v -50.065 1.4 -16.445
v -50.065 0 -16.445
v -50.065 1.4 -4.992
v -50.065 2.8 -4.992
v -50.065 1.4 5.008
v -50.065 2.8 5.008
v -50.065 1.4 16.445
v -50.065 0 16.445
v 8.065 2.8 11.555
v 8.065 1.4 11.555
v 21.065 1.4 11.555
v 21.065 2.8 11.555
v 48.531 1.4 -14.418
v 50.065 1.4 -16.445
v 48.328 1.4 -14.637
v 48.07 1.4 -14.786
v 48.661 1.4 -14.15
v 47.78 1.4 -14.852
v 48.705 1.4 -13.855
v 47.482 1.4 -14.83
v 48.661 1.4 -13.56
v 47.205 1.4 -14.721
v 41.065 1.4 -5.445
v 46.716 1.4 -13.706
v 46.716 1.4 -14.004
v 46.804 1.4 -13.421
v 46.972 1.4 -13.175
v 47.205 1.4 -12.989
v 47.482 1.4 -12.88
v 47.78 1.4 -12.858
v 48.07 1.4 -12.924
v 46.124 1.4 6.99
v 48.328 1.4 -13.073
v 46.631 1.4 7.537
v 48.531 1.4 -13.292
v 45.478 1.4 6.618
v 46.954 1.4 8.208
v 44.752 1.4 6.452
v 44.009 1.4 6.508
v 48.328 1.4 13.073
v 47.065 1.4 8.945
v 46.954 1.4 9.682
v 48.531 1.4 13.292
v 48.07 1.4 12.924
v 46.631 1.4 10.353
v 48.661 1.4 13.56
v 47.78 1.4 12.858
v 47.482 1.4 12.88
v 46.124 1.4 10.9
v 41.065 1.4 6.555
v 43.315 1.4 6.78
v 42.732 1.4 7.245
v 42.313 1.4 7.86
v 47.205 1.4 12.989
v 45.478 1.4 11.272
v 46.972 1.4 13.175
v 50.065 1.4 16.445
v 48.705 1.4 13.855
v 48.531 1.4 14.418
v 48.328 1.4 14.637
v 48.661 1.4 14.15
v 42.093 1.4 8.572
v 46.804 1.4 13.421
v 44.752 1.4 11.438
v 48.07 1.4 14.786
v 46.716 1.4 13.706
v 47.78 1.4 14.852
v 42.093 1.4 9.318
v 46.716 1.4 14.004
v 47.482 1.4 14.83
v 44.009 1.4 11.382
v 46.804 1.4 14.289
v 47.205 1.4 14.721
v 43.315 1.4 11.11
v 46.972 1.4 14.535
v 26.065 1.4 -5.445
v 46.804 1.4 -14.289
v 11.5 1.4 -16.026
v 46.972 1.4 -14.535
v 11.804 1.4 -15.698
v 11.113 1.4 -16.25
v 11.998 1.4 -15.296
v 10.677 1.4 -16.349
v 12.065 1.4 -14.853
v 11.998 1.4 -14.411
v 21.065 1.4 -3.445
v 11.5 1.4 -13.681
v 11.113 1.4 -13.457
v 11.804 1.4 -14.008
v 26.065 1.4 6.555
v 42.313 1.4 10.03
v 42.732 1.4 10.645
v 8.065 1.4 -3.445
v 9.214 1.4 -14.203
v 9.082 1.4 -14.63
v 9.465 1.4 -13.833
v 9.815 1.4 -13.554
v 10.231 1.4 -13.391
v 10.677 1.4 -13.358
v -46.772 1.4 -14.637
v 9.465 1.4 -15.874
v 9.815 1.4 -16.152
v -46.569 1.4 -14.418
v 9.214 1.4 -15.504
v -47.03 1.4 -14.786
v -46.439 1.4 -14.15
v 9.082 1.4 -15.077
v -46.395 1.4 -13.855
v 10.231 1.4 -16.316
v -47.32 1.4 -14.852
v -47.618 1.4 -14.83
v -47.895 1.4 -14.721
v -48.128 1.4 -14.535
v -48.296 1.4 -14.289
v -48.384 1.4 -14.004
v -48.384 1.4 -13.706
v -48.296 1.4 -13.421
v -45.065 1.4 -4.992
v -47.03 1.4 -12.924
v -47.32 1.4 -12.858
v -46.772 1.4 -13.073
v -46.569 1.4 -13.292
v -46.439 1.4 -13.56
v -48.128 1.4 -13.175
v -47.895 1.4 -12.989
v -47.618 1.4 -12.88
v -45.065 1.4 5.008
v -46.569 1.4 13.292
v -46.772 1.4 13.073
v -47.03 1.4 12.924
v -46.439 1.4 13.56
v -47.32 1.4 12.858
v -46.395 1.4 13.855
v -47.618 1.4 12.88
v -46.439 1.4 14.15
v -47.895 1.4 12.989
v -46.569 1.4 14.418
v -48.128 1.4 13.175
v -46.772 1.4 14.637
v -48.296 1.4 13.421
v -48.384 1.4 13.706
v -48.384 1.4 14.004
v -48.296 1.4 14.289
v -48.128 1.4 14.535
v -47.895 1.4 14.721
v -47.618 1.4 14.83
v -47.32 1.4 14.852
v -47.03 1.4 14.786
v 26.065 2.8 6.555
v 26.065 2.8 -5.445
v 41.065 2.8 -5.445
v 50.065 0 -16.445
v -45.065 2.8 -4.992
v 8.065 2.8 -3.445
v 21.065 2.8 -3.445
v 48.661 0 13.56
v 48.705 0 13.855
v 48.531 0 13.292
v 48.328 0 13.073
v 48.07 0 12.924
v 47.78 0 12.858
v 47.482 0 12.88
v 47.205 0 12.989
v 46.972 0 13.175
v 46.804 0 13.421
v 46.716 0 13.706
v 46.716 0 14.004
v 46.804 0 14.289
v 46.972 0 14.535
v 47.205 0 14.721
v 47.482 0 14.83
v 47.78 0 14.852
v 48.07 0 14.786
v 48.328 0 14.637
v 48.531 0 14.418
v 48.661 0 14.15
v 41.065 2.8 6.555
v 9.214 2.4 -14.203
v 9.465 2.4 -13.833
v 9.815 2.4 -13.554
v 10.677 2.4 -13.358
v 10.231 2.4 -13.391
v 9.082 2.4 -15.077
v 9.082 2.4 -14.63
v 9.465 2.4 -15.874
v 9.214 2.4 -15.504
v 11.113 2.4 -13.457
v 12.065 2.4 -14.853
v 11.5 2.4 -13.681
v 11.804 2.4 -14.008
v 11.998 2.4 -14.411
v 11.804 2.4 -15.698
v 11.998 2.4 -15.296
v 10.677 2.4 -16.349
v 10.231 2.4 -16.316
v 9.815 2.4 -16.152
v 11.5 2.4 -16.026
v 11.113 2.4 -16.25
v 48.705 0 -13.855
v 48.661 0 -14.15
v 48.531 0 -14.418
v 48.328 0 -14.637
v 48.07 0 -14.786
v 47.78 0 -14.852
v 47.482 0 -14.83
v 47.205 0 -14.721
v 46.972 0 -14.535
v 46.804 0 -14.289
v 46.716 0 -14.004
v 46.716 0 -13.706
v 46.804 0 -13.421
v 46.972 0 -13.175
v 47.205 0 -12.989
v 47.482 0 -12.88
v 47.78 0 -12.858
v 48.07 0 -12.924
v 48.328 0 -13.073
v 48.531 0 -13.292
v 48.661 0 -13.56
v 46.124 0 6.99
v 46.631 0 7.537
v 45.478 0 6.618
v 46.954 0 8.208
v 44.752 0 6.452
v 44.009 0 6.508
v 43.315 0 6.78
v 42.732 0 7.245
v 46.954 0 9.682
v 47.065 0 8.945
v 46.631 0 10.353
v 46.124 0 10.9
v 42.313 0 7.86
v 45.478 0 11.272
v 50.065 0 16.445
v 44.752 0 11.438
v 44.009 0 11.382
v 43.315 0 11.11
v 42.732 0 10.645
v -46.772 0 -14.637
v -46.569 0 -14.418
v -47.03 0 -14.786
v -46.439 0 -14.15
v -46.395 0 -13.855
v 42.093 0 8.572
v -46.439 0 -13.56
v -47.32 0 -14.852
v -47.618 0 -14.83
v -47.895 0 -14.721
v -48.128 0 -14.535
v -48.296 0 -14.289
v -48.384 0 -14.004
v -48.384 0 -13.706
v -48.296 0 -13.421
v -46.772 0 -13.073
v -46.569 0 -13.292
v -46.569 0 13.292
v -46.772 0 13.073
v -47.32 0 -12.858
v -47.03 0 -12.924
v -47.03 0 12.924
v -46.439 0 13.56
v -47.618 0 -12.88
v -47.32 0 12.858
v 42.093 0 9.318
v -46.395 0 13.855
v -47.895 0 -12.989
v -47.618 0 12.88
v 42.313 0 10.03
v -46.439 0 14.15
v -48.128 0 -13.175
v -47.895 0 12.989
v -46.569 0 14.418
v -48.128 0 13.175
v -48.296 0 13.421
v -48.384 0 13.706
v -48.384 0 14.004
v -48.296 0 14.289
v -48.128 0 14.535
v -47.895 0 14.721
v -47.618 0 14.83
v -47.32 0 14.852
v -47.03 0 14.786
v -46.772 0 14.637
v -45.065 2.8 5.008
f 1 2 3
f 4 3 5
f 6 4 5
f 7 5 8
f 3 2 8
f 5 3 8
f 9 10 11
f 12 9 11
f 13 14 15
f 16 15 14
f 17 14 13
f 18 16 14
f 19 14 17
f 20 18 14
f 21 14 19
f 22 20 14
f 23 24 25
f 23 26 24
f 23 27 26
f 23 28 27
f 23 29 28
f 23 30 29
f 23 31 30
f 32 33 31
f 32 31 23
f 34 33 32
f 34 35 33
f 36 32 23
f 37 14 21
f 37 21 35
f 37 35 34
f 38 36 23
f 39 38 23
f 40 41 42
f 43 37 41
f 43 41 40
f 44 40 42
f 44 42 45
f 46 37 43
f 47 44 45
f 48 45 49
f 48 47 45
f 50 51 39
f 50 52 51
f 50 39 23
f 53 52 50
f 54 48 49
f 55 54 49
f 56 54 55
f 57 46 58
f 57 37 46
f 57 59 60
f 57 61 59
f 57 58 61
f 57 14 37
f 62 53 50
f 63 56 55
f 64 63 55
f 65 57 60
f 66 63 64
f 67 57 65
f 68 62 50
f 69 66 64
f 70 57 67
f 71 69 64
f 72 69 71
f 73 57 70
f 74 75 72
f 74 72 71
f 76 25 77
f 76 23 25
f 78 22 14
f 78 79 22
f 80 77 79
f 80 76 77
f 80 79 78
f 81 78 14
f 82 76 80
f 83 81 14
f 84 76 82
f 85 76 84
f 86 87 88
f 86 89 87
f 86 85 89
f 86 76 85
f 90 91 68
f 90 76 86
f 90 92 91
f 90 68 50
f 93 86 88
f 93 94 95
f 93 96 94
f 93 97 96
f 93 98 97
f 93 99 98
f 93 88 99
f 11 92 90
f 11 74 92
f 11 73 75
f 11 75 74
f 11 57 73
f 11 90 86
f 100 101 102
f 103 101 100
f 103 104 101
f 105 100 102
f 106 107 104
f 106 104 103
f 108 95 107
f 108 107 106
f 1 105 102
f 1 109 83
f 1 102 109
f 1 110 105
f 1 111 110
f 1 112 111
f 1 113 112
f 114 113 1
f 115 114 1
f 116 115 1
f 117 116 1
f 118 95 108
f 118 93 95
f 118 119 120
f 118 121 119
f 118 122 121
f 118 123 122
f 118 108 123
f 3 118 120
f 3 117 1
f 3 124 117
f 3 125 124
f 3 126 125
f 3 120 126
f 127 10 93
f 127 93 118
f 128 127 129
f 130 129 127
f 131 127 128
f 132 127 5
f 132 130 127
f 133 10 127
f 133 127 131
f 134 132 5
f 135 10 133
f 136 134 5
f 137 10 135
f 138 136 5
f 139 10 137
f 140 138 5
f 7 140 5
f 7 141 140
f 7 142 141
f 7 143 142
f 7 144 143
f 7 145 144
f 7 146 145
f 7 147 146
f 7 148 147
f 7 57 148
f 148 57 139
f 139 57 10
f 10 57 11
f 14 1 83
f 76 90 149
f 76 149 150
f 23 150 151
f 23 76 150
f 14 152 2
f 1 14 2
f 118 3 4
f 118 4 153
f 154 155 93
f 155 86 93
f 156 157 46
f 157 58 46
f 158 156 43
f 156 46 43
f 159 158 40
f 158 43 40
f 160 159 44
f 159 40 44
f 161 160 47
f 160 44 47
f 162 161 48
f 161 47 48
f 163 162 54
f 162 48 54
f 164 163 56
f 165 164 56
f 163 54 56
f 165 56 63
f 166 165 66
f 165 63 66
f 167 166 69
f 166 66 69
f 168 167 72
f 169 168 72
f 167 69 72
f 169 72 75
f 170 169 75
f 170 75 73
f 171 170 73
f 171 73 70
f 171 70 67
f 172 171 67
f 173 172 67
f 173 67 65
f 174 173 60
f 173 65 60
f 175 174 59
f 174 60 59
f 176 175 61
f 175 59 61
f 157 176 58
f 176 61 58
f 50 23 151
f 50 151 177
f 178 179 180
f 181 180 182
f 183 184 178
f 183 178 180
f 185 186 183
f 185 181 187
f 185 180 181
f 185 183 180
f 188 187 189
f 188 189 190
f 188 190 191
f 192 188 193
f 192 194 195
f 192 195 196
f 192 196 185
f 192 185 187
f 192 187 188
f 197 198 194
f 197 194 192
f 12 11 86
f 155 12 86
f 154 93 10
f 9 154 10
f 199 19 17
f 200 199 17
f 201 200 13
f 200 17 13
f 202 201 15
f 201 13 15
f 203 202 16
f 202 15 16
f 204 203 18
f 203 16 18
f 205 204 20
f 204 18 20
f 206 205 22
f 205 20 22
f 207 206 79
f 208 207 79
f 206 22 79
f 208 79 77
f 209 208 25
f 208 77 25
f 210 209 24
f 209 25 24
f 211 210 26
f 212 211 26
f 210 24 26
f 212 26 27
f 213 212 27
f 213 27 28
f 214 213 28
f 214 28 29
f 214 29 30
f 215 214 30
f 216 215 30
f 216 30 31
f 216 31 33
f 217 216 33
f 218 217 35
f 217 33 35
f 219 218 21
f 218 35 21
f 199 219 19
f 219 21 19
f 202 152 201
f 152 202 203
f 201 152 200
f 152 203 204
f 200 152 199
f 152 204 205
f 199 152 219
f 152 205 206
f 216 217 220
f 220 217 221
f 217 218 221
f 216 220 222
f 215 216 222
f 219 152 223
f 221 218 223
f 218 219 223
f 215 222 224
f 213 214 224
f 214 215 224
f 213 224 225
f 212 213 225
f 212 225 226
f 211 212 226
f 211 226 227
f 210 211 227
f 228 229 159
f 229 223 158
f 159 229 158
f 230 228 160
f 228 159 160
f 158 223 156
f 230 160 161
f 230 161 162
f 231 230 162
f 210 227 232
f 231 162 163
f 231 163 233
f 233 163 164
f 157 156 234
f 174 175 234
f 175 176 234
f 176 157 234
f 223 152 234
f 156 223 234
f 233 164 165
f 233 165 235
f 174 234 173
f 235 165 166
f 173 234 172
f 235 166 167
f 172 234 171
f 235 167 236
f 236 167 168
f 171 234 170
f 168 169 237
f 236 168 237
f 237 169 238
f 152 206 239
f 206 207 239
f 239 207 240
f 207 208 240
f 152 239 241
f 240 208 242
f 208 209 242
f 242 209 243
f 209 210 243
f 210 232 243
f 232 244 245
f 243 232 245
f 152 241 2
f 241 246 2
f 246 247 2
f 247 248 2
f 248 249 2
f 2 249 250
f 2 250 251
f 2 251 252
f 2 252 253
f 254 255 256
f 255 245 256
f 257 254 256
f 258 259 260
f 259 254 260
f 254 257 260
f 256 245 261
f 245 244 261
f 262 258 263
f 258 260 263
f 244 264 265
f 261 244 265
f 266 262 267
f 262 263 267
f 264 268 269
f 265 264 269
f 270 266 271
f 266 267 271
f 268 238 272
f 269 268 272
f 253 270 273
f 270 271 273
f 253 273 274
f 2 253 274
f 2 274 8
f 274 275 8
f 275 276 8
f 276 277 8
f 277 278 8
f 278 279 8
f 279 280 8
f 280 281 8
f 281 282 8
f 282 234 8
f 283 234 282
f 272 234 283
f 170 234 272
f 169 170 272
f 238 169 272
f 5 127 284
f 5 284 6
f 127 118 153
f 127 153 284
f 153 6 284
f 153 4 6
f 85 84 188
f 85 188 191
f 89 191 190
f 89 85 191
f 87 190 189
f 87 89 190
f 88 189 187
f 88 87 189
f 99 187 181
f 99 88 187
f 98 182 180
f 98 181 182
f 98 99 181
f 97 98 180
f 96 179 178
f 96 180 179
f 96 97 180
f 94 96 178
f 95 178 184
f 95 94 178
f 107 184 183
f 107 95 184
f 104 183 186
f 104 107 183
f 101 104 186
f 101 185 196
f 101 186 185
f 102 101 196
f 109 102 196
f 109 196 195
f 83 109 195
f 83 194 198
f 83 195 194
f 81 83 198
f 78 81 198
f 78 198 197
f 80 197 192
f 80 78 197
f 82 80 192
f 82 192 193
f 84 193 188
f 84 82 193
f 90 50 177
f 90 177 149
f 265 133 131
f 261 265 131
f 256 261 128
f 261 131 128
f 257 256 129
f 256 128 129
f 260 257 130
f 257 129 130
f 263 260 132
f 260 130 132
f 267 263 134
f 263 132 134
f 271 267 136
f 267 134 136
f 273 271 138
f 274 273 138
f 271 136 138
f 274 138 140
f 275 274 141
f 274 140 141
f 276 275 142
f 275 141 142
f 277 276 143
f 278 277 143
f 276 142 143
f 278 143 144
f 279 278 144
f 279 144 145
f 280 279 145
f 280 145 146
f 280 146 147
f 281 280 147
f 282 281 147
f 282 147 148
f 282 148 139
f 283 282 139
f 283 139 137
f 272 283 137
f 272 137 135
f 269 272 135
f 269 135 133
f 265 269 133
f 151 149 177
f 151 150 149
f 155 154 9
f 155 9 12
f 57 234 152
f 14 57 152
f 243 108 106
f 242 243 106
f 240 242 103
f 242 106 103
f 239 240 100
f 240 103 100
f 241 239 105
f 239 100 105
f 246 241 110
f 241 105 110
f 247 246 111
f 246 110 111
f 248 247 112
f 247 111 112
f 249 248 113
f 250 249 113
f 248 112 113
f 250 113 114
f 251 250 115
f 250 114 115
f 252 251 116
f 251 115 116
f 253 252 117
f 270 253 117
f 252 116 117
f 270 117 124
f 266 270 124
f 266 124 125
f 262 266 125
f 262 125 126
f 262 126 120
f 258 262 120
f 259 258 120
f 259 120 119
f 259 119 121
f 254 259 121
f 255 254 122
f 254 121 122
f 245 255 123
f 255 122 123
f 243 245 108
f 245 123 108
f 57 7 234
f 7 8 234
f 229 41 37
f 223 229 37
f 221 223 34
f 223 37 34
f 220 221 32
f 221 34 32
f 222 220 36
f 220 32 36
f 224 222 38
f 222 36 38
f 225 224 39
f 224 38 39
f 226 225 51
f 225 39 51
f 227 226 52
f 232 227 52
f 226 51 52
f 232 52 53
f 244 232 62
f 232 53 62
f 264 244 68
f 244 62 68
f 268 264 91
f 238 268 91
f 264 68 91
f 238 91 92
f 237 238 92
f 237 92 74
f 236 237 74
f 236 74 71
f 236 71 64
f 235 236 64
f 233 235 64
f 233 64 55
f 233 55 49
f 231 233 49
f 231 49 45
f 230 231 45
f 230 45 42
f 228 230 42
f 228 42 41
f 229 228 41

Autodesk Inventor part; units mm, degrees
ref_plane "YZ Plane" through (0, 0, 0) normal (1, 0, 0) x (0, 1, 0)
ref_plane "XZ Plane" through (0, 0, 0) normal (0, 1, 0) x (-1, 0, 0)
ref_plane "XY Plane" through (0, 0, 0) normal (0, 0, 1) x (1, 0, 0)
sketch "Boceto1" plane through (0, 0, 0) normal (0, 1, 0) x (-1, 0, 0)
  line L0 (50.065, 16.445) -> (-50.065, 16.445)
  line L1 (-50.065, 16.445) -> (-50.065, -16.445)
  line L2 (-50.065, -16.445) -> (50.065, -16.445)
  line L3 (50.065, -16.445) -> (50.065, 16.445)
  point P0 (0, 0)
  dimension "q" = 100.13
  dimension "t" = 32.89
  dimension "d3" = 16.445
  dimension "d4" = 50.065
extrude "Extrusión1" add sketch "Boceto1" along normal blind 1.4
sketch "Boceto2" plane through (0, 1.4, 0) normal (0, 1, 0) x (1, 0, 0)
  circle A0 centre (-47.395, -13.855) radius 1
  circle A1 centre (-47.395, 13.855) radius 1
  line L0 (-50.065, -16.445) -> (50.065, -16.445) projected
  line L1 (50.065, 16.445) -> (-50.065, 16.445) projected
  line L2 (-50.065, 16.445) -> (-50.065, -16.445) projected
  circle A2 centre (47.705, -13.855) radius 1
  circle A3 centre (47.705, 13.855) radius 1
  line L3 (50.065, -16.445) -> (50.065, 16.445) projected
  point P0 (0, 0)
  dimension "d7" = 2
  dimension "d8" = 2
  dimension "v" = 2.59
  dimension "d10" = 2.59
  dimension "d11" = 2.67
  dimension "d12" = 2.67
  dimension "d13" = 2
  dimension "d14" = 2
  dimension "d15" = 2.59
  dimension "d16" = 2.59
  dimension "d17" = 2.36
  dimension "d18" = 2.36
extrude "Extrusión2" cut sketch "Boceto2" against normal blind 1.4 contours A0 | A1 | A2 | A3
sketch "Boceto3" plane through (0, 1.4, 0) normal (0, 1, 0) x (1, 0, 0)
  line L0 (-50.065, 16.445) -> (-50.065, -16.445) projected
  line L1 (-45.065, -5.0075) -> (-50.065, -5.0075)
  line L2 (-50.065, -5.0075) -> (-50.065, 4.9925)
  line L3 (-50.065, 4.9925) -> (-45.065, 4.9925)
  line L4 (-45.065, 4.9925) -> (-45.065, -5.0075)
  line L5 (8.065, -11.555) -> (21.065, -11.555)
  line L6 (21.065, -11.555) -> (21.065, 3.445)
  line L7 (21.065, 3.445) -> (8.065, 3.445)
  line L8 (8.065, 3.445) -> (8.065, -11.555)
  line L9 (50.065, -16.445) -> (50.065, 16.445) projected
  line L10 (50.065, 16.445) -> (-50.065, 16.445) projected
  line L11 (41.065, -6.555) -> (26.065, -6.555)
  line L12 (26.065, -6.555) -> (26.065, 5.445)
  line L13 (26.065, 5.445) -> (41.065, 5.445)
  line L14 (41.065, 5.445) -> (41.065, -6.555)
  point P0 (0, 0)
  dimension "d22" = 10
  dimension "d23" = 5
  dimension "d24" = 13
  dimension "d25" = 15
  dimension "d26" = 42
  dimension "d27" = 28
  dimension "d28" = 15
  dimension "d29" = 12
  dimension "d30" = 24
  dimension "d31" = 23
extrude "Extrusión3" add sketch "Boceto3" along normal blind 1.4
sketch "Boceto4" plane through (0, 2.8, 0) normal (0, 1, 0) x (1, 0, 0)
  point P0 (0, 0)
  point P1 (8.9547, -10.1632)
sketch "Boceto5" plane through (0, 2.8, 0) normal (0, 1, 0) x (1, 0, 0)
  line L0 (19.4822, 1.7557) -> (19.4822, -9.7421) construction
  line L1 (19.4822, -9.7421) -> (15.3355, -9.7421) construction
  line L2 (15.3355, -9.7421) -> (15.3355, 1.7557) construction
  line L3 (15.3355, 1.7557) -> (19.4822, 1.7557) construction
  point P0 (0, 0)
sketch "Boceto6" plane through (0, 2.8, 0) normal (0, 1, 0) x (1, 0, 0)
  line L0 (14.4245, 1.2531) -> (14.4245, -8.6603) construction
  line L1 (14.4245, -8.6603) -> (9.5235, -8.6603) construction
  line L2 (9.5235, -8.6603) -> (9.5235, 1.2531) construction
  line L3 (9.5235, 1.2531) -> (14.4245, 1.2531) construction
  point P0 (0, 0)
sketch "Boceto7" plane through (0, 1.4, 0) normal (0, 1, 0) x (1, 0, 0)
  circle A0 centre (44.565, -8.945) radius 2.5
  line L0 (50.065, -16.445) -> (50.065, 16.445) projected
  line L1 (-50.065, -16.445) -> (50.065, -16.445) projected
  point P0 (0, 0)
  dimension "d34" = 5
  dimension "d38" = 3
  dimension "d39" = 5
extrude "Extrusión4" cut sketch "Boceto7" against normal blind 1.4
sketch "Boceto8" plane through (0, 1.4, 0) normal (0, 1, 0) x (1, 0, 0)
  circle A0 centre (10.565, 14.8534) radius 1.5
  line L0 (50.065, -16.445) -> (50.065, 16.445) projected
  point P0 (0, 0)
  dimension "d42" = 3
  dimension "d43" = 41
extrude "Extrusión5" add sketch "Boceto8" along normal blind 1
equation "\"d3\" = 0.5 * t"
equation "\"d4\" = 0.5 * q"
equation "\"d10\" = v"
equation "\"d15\" = v"
equation "\"d16\" = v"
properties part number "tBeam"
